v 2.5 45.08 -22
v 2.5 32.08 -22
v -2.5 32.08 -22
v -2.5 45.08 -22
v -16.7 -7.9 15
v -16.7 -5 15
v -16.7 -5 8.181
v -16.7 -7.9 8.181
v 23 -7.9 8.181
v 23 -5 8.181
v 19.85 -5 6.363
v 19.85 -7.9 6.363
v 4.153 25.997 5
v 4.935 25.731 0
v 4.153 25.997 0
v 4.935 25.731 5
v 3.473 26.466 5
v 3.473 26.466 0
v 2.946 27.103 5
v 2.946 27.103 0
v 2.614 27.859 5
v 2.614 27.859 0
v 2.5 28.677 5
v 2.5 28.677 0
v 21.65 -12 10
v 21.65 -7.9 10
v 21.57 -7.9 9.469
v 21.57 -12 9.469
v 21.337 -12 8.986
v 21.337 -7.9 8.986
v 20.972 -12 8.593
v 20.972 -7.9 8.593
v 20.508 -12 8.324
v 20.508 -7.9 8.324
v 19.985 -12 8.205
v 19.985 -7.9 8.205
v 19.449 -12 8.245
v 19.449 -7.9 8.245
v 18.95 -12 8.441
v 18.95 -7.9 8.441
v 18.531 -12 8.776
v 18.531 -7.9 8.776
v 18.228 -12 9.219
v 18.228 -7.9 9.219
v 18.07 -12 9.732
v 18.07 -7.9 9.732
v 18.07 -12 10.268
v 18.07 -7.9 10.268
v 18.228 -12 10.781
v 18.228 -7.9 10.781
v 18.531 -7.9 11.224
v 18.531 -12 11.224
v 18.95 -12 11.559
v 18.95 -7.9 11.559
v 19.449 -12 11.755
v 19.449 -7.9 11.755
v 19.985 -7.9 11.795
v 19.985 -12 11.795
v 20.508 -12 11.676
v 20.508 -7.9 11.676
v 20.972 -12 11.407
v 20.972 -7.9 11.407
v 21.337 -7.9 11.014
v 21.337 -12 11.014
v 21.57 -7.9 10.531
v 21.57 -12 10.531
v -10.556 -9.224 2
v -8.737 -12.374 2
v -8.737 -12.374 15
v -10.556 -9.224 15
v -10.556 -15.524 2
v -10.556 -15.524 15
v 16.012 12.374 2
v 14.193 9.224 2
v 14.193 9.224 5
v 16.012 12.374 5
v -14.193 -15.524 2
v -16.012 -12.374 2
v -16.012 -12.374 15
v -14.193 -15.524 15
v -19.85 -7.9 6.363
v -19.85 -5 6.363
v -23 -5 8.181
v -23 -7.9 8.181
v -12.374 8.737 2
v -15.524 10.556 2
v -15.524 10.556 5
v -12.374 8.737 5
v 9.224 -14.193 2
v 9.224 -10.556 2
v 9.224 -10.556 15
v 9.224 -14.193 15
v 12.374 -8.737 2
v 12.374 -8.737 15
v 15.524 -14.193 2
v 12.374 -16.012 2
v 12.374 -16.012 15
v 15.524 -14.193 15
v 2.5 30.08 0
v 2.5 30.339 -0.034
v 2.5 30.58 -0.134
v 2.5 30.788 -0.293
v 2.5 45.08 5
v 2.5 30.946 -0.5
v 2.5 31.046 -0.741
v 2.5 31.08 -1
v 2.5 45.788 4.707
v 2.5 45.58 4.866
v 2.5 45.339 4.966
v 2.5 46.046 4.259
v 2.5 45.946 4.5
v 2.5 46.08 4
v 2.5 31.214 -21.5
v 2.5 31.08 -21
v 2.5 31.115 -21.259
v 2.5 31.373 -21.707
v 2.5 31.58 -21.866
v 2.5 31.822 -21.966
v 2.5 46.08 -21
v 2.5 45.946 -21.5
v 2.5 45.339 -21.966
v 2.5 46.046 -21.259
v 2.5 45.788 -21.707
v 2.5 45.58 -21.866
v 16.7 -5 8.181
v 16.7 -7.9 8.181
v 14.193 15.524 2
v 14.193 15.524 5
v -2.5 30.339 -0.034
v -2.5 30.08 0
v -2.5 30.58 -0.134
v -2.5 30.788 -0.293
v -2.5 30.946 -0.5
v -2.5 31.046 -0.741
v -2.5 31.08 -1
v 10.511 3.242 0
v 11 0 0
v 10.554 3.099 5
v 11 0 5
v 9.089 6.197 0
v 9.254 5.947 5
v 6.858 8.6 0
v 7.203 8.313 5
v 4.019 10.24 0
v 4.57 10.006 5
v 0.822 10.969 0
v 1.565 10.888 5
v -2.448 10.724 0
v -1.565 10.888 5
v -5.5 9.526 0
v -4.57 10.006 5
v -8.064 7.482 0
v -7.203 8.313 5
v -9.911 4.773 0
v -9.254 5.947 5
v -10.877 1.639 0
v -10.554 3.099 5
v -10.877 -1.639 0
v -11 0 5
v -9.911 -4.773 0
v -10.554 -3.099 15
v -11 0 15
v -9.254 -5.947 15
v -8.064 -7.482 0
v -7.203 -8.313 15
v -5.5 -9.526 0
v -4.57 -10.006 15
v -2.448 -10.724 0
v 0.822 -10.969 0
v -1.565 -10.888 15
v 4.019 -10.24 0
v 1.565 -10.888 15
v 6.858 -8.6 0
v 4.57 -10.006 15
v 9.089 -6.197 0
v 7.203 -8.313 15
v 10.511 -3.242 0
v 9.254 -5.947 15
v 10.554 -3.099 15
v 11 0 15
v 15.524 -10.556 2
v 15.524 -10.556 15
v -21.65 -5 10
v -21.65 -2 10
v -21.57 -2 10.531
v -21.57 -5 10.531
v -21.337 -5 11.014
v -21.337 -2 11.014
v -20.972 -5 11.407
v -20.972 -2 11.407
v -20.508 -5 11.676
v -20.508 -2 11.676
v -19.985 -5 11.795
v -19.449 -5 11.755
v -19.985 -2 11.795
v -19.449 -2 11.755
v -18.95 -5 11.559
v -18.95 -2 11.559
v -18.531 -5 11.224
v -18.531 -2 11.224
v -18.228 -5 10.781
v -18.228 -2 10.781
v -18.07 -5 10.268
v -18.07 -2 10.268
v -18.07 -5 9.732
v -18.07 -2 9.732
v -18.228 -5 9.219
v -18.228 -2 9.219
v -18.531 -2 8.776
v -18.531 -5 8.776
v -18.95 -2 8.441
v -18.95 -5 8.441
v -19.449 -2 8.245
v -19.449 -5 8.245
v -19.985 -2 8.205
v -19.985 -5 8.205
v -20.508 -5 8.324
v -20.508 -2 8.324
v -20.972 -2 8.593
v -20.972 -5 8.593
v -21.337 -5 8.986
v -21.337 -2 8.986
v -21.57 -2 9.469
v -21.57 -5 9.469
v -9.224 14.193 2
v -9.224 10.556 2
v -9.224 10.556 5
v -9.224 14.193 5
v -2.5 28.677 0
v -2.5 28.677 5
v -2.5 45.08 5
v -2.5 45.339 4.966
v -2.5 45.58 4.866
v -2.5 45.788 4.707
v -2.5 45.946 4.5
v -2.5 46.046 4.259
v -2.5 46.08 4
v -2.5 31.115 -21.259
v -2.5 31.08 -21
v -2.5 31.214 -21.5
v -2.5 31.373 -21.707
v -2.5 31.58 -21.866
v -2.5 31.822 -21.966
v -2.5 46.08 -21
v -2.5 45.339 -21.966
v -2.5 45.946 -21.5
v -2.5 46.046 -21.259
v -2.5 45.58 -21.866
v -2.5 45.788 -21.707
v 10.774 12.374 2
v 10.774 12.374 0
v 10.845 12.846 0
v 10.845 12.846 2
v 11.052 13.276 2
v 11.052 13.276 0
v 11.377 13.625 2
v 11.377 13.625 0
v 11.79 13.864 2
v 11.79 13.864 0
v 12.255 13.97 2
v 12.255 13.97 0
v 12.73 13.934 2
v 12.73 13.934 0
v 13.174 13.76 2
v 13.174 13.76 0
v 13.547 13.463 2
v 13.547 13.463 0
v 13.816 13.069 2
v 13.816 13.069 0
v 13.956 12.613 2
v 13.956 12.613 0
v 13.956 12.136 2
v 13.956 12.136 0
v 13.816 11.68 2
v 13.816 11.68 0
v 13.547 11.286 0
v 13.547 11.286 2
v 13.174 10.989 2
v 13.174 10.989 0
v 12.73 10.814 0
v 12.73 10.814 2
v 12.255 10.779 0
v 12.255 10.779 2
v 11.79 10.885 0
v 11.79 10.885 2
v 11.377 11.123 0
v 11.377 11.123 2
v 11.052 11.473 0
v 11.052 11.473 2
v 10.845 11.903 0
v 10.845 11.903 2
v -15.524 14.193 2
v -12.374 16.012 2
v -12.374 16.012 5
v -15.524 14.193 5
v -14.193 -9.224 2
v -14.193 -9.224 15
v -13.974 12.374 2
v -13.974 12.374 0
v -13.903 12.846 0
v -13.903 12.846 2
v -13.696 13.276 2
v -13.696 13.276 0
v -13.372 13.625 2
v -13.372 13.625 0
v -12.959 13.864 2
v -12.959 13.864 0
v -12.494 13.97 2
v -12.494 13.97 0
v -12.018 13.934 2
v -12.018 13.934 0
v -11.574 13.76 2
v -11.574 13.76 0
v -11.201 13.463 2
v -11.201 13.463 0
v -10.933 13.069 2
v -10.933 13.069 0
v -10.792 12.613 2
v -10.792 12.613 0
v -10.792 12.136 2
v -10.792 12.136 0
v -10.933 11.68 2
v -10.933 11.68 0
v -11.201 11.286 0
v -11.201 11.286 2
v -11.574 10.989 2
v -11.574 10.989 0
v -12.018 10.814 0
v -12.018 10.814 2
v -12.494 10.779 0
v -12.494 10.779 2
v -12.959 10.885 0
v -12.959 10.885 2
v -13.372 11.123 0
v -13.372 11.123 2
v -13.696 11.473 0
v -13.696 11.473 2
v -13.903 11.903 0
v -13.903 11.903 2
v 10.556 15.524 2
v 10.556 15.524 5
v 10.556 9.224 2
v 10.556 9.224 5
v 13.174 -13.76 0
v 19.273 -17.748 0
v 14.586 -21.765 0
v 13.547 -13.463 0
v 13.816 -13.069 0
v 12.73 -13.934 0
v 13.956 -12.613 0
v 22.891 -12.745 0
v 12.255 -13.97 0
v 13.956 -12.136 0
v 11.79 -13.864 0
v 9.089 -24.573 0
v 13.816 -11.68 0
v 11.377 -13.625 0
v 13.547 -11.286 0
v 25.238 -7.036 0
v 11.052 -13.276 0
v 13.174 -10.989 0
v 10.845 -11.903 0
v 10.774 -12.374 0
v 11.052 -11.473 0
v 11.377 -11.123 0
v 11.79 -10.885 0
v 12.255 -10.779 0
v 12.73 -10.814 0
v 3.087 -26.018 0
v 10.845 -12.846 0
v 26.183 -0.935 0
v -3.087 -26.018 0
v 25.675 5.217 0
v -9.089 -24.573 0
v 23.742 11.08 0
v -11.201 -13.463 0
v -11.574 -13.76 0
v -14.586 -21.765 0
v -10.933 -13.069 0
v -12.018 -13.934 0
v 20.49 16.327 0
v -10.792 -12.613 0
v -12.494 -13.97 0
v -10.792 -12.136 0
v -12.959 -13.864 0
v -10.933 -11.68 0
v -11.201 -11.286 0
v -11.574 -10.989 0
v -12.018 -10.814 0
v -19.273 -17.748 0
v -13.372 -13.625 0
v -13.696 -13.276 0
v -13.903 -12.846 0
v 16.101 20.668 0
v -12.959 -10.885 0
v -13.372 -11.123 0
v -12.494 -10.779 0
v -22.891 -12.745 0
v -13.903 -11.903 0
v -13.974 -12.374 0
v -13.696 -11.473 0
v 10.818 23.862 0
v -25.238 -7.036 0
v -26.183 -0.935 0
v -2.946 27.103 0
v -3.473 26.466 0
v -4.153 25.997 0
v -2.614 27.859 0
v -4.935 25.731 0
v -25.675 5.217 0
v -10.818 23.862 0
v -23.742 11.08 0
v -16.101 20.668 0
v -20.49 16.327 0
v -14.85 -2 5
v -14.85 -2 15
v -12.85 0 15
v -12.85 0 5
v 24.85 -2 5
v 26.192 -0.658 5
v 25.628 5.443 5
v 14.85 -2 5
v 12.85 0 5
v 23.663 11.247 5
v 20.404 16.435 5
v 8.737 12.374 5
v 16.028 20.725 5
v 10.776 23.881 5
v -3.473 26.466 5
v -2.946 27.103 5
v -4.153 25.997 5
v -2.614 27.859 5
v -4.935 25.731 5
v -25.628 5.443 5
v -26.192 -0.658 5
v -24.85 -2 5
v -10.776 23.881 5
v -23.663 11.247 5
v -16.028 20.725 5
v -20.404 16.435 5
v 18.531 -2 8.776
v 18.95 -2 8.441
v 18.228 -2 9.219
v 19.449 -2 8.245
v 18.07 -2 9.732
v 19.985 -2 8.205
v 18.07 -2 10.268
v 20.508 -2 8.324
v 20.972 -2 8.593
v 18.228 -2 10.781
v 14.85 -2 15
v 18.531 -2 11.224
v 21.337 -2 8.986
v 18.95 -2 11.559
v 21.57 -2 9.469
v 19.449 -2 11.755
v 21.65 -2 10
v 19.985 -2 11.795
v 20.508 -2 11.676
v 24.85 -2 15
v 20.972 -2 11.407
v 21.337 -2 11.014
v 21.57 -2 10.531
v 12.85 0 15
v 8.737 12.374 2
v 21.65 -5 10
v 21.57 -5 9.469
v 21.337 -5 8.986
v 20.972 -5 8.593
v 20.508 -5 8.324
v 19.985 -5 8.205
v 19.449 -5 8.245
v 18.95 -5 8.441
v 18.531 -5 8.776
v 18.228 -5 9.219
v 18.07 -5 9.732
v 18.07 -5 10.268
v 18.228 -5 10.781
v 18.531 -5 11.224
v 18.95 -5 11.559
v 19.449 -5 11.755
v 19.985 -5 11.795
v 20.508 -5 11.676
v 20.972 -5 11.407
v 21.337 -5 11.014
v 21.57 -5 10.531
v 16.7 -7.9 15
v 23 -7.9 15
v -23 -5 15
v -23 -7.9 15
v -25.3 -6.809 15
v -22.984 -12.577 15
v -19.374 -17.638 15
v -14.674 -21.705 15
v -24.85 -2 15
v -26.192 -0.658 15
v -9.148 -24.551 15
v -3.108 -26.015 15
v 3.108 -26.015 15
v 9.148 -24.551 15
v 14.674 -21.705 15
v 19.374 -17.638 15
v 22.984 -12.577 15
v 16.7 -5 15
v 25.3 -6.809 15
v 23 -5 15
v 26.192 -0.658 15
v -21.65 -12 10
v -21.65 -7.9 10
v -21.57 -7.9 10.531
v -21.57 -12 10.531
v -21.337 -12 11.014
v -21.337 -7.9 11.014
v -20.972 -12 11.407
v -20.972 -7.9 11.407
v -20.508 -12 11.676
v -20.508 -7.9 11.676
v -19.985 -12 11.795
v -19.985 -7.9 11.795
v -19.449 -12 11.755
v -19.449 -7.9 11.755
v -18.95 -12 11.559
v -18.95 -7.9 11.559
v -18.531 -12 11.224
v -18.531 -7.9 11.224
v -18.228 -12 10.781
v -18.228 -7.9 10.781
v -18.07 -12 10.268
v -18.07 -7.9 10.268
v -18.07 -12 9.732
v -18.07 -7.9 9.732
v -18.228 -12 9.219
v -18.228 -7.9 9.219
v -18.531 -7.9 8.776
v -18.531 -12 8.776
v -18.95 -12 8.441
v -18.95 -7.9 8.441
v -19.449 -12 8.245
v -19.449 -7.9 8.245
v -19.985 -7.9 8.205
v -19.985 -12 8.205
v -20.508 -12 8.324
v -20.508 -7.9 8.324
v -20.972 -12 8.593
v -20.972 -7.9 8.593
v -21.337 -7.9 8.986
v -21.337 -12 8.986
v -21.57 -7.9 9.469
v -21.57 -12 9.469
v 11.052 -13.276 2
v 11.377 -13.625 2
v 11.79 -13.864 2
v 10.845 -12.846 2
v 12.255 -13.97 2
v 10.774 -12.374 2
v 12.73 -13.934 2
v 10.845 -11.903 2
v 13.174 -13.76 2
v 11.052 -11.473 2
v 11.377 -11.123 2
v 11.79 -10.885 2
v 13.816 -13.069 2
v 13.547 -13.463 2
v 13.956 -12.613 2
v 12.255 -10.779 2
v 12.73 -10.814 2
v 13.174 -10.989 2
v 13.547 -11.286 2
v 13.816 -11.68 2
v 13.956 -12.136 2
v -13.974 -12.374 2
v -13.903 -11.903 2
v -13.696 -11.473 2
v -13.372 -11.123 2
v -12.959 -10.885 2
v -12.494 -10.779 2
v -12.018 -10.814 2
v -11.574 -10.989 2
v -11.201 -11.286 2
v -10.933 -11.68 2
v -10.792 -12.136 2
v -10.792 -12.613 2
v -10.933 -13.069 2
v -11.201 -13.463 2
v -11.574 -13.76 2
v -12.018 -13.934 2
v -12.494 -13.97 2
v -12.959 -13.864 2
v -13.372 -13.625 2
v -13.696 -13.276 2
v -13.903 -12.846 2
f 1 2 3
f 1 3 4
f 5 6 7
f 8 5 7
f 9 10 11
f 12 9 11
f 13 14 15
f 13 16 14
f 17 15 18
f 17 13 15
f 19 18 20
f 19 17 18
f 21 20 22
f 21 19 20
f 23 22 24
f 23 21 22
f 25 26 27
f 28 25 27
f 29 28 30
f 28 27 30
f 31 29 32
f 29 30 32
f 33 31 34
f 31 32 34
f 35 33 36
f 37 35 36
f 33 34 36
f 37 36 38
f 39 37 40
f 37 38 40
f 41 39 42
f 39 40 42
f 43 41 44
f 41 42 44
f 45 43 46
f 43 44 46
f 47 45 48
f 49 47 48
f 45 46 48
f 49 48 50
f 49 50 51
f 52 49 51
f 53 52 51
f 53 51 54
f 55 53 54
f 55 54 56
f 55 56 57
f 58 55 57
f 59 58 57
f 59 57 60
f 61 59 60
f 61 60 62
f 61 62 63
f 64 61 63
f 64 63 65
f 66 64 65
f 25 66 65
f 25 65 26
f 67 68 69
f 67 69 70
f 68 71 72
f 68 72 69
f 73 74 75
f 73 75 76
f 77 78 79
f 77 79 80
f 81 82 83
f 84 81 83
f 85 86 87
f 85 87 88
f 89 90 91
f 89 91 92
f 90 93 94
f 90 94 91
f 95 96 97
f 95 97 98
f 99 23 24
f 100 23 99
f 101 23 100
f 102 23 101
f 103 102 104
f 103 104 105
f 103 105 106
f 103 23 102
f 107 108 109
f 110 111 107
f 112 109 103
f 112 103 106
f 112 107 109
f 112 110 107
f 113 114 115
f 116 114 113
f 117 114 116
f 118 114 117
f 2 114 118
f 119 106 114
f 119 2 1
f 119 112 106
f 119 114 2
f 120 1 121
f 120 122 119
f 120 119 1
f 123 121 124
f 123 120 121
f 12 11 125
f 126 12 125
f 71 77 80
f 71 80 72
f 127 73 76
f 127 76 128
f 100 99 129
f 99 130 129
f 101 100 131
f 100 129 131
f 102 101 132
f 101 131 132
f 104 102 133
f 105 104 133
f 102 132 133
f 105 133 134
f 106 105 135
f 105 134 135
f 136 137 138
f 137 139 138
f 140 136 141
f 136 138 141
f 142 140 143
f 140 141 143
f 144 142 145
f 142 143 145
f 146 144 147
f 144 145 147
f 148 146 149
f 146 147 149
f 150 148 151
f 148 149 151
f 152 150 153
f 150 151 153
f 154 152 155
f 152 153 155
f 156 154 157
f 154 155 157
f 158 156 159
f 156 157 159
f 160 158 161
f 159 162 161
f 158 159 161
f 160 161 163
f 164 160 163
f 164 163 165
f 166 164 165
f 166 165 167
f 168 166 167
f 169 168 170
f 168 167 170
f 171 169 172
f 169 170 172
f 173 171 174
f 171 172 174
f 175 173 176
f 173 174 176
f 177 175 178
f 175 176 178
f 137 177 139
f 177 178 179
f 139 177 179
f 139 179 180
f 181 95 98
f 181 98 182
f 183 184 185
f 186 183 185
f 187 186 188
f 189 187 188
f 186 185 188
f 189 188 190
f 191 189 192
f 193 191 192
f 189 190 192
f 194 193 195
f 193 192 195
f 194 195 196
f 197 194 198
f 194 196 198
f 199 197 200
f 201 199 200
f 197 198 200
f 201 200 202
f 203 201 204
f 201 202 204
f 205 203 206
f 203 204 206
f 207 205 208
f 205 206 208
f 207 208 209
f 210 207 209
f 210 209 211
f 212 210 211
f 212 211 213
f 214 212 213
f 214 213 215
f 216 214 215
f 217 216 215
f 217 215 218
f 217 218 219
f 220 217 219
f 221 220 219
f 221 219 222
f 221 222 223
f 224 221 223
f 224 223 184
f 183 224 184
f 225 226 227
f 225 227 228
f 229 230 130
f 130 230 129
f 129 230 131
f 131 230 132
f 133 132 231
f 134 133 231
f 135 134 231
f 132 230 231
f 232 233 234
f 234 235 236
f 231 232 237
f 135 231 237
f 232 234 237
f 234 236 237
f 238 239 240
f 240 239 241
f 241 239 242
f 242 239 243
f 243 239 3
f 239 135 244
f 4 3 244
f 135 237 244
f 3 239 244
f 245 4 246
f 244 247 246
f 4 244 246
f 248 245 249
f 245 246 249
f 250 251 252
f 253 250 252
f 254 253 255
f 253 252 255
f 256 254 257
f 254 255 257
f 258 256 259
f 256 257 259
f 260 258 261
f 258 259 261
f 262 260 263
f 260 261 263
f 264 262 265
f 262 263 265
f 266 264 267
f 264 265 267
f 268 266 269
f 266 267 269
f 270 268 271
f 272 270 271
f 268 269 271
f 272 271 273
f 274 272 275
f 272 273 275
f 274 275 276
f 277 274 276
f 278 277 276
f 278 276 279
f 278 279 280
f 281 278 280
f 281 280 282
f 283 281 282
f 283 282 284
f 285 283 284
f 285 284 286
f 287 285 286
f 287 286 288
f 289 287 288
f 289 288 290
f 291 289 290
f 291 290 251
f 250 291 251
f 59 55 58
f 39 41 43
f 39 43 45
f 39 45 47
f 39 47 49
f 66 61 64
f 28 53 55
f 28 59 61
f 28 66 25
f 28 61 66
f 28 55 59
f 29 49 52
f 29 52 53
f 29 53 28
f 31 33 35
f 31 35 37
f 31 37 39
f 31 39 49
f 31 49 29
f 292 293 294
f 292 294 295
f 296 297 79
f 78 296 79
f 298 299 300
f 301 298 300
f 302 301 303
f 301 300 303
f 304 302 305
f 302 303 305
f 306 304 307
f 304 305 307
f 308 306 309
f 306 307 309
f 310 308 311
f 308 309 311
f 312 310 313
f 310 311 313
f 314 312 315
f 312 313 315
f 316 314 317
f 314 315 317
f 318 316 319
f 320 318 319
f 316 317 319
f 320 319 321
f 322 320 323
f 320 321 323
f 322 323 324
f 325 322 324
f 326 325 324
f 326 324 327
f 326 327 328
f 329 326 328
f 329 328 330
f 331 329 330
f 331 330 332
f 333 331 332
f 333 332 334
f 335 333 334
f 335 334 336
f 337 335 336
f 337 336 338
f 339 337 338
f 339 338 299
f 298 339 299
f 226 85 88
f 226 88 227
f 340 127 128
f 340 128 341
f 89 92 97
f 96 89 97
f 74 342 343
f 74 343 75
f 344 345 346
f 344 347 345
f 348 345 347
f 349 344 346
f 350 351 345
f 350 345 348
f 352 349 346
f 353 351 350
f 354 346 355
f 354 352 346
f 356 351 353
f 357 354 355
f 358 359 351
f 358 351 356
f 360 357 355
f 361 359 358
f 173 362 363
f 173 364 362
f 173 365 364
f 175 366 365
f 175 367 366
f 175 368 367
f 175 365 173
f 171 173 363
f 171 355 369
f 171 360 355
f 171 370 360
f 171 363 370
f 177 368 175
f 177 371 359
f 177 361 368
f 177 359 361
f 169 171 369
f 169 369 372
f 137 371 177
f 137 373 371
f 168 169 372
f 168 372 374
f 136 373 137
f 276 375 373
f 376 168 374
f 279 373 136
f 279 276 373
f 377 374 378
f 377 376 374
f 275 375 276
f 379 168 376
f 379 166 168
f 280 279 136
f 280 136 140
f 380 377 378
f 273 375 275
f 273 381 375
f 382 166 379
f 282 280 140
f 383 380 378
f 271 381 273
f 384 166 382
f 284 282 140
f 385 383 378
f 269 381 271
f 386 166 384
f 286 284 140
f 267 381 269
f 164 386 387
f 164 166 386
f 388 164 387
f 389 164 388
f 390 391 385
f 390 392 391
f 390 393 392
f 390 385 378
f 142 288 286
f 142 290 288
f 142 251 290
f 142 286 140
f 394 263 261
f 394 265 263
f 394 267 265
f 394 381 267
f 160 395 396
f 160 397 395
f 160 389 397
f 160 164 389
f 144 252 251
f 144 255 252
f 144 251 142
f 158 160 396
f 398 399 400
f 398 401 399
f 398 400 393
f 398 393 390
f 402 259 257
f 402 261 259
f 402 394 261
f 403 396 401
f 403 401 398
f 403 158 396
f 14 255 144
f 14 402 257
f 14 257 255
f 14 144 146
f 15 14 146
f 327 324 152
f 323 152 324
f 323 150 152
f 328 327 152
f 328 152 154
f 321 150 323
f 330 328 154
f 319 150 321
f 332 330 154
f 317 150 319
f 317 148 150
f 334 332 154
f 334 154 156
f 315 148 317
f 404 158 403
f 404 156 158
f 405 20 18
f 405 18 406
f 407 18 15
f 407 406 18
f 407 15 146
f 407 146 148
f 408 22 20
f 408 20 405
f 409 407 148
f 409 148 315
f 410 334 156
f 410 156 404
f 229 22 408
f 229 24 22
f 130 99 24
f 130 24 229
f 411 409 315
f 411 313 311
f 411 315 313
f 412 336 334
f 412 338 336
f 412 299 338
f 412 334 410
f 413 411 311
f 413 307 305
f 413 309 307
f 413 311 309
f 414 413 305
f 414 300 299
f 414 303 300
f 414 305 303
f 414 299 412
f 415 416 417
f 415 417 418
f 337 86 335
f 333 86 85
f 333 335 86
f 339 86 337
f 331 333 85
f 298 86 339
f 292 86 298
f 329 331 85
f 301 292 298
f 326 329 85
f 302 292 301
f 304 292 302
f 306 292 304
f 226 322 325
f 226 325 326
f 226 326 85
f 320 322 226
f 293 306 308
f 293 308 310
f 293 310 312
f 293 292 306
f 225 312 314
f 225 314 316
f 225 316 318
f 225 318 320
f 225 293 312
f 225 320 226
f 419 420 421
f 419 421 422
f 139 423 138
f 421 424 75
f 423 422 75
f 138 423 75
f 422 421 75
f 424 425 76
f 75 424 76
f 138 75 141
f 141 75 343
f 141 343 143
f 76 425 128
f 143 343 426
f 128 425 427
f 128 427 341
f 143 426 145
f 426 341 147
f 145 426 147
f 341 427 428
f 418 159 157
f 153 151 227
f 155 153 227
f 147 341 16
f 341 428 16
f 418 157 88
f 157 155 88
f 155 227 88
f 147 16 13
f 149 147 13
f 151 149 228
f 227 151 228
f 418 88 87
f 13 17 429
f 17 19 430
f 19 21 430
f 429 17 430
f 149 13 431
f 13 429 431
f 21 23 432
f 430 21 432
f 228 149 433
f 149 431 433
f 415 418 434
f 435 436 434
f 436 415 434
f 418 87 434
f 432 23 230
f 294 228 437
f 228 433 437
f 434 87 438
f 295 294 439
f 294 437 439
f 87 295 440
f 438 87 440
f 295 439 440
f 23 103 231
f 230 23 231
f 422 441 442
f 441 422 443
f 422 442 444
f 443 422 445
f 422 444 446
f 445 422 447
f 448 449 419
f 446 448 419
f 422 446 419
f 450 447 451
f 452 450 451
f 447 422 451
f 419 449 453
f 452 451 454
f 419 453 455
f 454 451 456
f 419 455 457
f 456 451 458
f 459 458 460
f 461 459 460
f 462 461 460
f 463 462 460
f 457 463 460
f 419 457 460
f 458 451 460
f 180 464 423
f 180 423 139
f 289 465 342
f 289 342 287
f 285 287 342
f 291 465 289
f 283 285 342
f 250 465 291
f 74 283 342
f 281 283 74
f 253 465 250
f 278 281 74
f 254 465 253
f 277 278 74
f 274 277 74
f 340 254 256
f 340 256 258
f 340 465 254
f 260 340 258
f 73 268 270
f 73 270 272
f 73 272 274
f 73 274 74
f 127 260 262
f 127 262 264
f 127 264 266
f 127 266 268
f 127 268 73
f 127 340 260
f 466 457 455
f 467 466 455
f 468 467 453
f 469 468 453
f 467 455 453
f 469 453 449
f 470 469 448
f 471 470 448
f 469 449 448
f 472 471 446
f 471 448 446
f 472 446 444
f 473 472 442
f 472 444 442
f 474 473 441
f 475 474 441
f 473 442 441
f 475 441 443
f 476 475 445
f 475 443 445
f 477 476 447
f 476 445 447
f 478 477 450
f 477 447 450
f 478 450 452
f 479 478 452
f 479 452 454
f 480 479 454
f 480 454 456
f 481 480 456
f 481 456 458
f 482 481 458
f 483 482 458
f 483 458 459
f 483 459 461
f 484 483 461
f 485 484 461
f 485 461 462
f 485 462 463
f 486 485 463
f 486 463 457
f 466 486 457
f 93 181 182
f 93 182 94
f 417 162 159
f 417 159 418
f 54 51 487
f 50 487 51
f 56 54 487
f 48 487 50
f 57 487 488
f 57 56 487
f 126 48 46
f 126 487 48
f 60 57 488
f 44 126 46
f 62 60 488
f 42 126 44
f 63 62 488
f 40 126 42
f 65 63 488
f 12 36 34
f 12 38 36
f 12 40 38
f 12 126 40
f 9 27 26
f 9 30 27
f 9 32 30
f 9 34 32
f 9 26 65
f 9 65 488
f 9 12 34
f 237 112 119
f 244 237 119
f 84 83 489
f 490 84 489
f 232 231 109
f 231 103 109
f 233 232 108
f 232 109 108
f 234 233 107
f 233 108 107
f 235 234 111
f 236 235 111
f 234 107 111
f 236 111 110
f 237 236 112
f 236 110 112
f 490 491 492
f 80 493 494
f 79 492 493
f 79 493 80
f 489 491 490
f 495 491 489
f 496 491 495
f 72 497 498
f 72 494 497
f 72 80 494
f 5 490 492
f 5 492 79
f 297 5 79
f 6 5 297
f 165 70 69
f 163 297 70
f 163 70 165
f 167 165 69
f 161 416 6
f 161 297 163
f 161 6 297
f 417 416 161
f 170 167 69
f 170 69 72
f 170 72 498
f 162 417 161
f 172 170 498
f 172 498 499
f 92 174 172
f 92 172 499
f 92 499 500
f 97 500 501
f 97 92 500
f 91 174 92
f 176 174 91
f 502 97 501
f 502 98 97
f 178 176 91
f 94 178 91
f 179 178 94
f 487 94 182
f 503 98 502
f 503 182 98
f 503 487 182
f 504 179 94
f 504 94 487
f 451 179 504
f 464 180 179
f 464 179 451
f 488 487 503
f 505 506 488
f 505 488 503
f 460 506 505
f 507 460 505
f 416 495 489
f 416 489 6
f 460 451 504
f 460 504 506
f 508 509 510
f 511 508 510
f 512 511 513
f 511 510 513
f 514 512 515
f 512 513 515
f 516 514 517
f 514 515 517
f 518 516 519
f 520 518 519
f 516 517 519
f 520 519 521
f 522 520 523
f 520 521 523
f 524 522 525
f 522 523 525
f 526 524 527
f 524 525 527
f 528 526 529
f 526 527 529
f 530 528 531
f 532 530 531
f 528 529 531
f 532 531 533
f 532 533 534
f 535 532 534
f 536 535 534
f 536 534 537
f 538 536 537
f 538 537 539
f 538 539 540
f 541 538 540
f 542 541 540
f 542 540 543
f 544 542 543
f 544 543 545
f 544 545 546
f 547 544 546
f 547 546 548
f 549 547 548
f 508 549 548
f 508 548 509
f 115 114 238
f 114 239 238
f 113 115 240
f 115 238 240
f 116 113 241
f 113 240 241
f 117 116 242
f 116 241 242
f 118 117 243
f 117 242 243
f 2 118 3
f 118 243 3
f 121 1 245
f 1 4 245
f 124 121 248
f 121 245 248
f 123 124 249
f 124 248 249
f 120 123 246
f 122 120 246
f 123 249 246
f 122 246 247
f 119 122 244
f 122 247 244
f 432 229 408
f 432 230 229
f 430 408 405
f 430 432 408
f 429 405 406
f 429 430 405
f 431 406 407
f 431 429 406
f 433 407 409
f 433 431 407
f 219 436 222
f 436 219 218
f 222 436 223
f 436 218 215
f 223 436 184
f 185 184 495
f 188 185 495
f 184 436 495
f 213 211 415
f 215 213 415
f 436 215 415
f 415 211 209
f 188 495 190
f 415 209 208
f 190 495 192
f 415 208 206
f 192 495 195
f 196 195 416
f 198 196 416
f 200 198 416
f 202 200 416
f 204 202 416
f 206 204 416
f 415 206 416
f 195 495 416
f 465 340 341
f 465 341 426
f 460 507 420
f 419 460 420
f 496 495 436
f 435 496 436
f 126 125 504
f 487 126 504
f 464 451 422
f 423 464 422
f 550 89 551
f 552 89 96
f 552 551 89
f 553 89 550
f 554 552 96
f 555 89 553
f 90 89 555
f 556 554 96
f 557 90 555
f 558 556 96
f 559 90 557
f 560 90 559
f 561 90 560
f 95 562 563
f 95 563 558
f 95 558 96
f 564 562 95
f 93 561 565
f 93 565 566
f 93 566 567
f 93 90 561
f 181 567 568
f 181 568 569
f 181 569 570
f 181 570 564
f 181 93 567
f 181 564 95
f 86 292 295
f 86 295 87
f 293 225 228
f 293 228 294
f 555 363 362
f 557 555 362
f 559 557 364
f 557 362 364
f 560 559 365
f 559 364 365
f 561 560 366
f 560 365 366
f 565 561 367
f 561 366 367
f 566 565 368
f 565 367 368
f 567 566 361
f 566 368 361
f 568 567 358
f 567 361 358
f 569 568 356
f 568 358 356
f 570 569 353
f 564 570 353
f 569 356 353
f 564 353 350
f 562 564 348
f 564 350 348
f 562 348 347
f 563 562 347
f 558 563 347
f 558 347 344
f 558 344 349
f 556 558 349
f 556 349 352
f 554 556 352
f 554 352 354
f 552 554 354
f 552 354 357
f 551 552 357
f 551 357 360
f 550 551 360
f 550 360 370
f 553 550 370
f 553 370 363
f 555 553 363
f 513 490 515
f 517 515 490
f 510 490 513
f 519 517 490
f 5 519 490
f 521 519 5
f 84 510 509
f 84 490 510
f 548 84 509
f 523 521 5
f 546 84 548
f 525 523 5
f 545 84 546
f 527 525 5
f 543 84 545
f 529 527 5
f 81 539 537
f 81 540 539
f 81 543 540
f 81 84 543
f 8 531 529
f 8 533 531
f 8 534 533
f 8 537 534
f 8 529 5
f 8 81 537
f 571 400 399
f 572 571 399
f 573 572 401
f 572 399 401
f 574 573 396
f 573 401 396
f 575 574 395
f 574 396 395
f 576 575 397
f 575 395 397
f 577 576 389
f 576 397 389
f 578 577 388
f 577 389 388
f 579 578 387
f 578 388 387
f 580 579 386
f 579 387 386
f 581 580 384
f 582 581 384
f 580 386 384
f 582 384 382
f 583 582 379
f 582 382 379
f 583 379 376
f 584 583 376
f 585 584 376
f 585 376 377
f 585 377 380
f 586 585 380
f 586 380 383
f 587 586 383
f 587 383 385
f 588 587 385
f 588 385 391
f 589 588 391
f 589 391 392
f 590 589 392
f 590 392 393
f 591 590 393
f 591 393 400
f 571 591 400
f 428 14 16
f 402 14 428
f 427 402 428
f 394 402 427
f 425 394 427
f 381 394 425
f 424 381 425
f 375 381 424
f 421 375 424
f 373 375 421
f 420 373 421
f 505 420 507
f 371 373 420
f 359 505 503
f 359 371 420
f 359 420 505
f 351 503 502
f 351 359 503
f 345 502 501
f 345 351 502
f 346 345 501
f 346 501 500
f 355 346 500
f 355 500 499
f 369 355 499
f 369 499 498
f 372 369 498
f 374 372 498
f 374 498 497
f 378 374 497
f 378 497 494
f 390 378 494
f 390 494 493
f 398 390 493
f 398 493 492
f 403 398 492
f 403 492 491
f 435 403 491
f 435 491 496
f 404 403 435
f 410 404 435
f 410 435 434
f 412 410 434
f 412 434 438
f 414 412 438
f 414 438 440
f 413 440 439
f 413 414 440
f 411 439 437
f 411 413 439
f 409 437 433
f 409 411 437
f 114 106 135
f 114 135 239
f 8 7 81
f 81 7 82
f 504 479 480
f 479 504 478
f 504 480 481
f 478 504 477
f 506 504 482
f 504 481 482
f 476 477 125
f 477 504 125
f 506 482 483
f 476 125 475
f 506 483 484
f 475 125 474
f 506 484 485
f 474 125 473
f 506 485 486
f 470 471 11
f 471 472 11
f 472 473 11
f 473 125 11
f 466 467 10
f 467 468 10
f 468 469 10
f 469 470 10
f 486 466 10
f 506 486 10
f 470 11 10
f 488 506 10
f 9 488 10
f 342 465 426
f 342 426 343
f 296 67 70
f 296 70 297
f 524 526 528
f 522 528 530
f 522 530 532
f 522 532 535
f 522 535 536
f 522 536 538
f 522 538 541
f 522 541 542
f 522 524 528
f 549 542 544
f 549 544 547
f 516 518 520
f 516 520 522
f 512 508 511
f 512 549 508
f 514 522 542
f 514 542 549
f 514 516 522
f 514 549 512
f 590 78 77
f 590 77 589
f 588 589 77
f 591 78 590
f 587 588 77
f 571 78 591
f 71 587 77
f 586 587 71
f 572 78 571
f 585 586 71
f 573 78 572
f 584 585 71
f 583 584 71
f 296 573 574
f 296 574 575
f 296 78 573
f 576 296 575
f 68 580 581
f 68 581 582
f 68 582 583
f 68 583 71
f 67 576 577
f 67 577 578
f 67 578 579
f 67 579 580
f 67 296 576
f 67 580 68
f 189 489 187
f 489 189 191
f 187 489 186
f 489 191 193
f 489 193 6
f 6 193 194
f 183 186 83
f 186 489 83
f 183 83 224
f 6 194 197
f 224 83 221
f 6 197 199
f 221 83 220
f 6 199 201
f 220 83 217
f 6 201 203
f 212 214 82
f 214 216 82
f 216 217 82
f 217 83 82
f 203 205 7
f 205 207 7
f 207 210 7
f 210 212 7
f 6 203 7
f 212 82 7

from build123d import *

# Parameters (mm, degrees)
ESBO_O1_R                = 28.7
RESSALTO_EXTRUS_O1_DEPTH = 5
ESBO_O2_R                = 11
CORTE_EXTRUS_O1_DEPTH    = 8
ESBO_O3_R                = 7.5
CORTE_EXTRUS_O2_DEPTH    = 42.801674608
RESSALTO_EXTRUS_O4_START = 10
RESSALTO_EXTRUS_O4_DEPTH = 10
ESBO_O9_W                = 10
ESBO_O9_H                = 2
CORTE_EXTRUS_O5_DEPTH    = 10
CHANFRO1_SIZE            = 2
ESBO_O10_R               = 1.8
CORTE_EXTRUS_O6_DEPTH    = 10
CORTE_EXTRUS_O7_START    = -3
CORTE_EXTRUS_O7_DEPTH    = 2.9
CORTE_EXTRUS_O8_START    = -5
ESBO_O13_R               = 28.7
CORTE_EXTRUS_O8_DEPTH    = 5
ESBO_O14_R               = 28.7
ESBO_O14_R_2             = 26.2
CORTE_EXTRUS_O9_DEPTH    = 44.271006459
ESBO_O15_R               = 1.6
CORTE_EXTRUS_O10_DEPTH   = 40.973491216
CORTE_EXTRUS_O11_START   = -3
CORTE_EXTRUS_O11_DEPTH   = 42.378118766
RESSALTO_EXTRUS_O5_START = -5
RESSALTO_EXTRUS_O5_DEPTH = 5
ESBO_O19_W               = 22
ESBO_O19_H               = 15
RESSALTO_EXTRUS_O6_DEPTH = 5
FILETE1_R                = 3
FILETE2_R                = 1
FILETE3_R                = 1


with BuildPart() as part:
    # Esboço1 → Ressalto-extrusão1 (new, symmetric)
    with BuildSketch(Plane.XY):
        Circle(ESBO_O1_R)
    extrude(amount=RESSALTO_EXTRUS_O1_DEPTH, both=True)

    # Esboço2 → Corte-extrusão1 (cut)
    with BuildSketch(Plane.XY.offset(5)):
        Circle(ESBO_O2_R)
    extrude(amount=-CORTE_EXTRUS_O1_DEPTH, mode=Mode.SUBTRACT)

    # Esboço3 → Corte-extrusão2 (cut, through all)
    with BuildSketch(Plane(origin=(0, 0, -5), x_dir=(-1, 0, 0), z_dir=(0, 0, -1))):
        Circle(ESBO_O3_R)
    extrude(amount=-CORTE_EXTRUS_O2_DEPTH, mode=Mode.SUBTRACT)

    # Esboço8 → Ressalto-extrusão4 (add)
    with BuildSketch(Plane.XY.offset(5).offset(RESSALTO_EXTRUS_O4_START)):
        with BuildLine():
            Line((-11, 0), (-28.7, 0))
            ThreePointArc((-28.7, 0), (0, -28.7), (28.7, 0))
            Line((28.7, 0), (11, 0))
            ThreePointArc((11, 0), (0, -11), (-11, 0))
        make_face()
    extrude(amount=-RESSALTO_EXTRUS_O4_DEPTH)

    # Esboço9 → Corte-extrusão5 (cut)
    with BuildSketch(Plane.XY.offset(15)):
        with Locations((-19.85, -1)):
            Rectangle(ESBO_O9_W, ESBO_O9_H)
        with Locations((19.85, -1)):
            Rectangle(ESBO_O9_W, ESBO_O9_H)
    extrude(amount=-CORTE_EXTRUS_O5_DEPTH, mode=Mode.SUBTRACT)

    # Chanfro1
    chanfro1_edges = [part.edges().sort_by_distance(p)[0] for p in [
        (24.85, 0, 10),
        (14.85, 0, 10),
        (-14.85, 0, 10),
        (-24.85, 0, 10),
    ]]
    chamfer(chanfro1_edges, length=CHANFRO1_SIZE - 0.0001)  # a hair under: the kernel refuses the full size

    # Esboço10 → Corte-extrusão6 (cut)
    with BuildSketch(Plane(origin=(0, -2, 0), x_dir=(1, 0, 0), z_dir=(0, 1, 0))):
        with Locations(Location((-19.85, -10, 0), (0, 0, 180))):
            Circle(ESBO_O10_R)
        with Locations((19.85, -10)):
            Circle(ESBO_O10_R)
    extrude(amount=-CORTE_EXTRUS_O6_DEPTH, mode=Mode.SUBTRACT)

    # Esboço11 → Corte-extrusão7 (cut)
    with BuildSketch(Plane(origin=(0, -2, 0), x_dir=(1, 0, 0), z_dir=(0, 1, 0)).offset(CORTE_EXTRUS_O7_START)):
        Polygon((-23, -8.181346652), (-23, -11.818653348), (-23, -15), (-16.7, -15), (-16.7, -11.818653348), (-16.7, -8.181346652), (-19.85, -6.362693304), align=None)
        Polygon((23, -15), (23, -11.818653348), (23, -8.181346652), (19.85, -6.362693304), (16.7, -8.181346652), (16.7, -11.818653348), (16.7, -15), align=None)
    extrude(amount=-CORTE_EXTRUS_O7_DEPTH, mode=Mode.SUBTRACT)

    # Esboço13 → Corte-extrusão8 (cut)
    with BuildSketch(Plane(origin=(0, 0, -5), x_dir=(-1, 0, 0), z_dir=(0, 0, -1)).offset(CORTE_EXTRUS_O8_START)):
        Circle(ESBO_O13_R)
    extrude(amount=CORTE_EXTRUS_O8_DEPTH, mode=Mode.SUBTRACT)

    # Esboço14 → Corte-extrusão9 (cut, through all)
    with BuildSketch(Plane(origin=(0, 0, 0), x_dir=(-1, 0, 0), z_dir=(0, 0, -1))):
        Circle(ESBO_O14_R)
        Circle(ESBO_O14_R_2, mode=Mode.SUBTRACT)
    extrude(amount=-CORTE_EXTRUS_O9_DEPTH, mode=Mode.SUBTRACT)

    # Esboço15 → Corte-extrusão10 (cut, through all)
    with BuildSketch(Plane(origin=(0, 0, 0), x_dir=(-1, 0, 0), z_dir=(0, 0, -1))):
        with Locations((-12.374368671, 12.374368671)):
            Circle(ESBO_O15_R)
        with Locations((12.374368671, 12.374368671)):
            Circle(ESBO_O15_R)
        with Locations((12.374368671, -12.374368671)):
            Circle(ESBO_O15_R)
        with Locations((-12.374368671, -12.374368671)):
            Circle(ESBO_O15_R)
    extrude(amount=-CORTE_EXTRUS_O10_DEPTH, mode=Mode.SUBTRACT)

    # Esboço17 → Corte-extrusão11 (cut, through all)
    with BuildSketch(Plane.XY.offset(5).offset(CORTE_EXTRUS_O11_START)):
        Polygon((-15.524368671, 14.193022019), (-15.524368671, 10.555715323), (-12.374368671, 8.737061975), (-9.224368671, 10.555715323), (-9.224368671, 14.193022019), (-12.374368671, 16.011675367), align=None)
        Polygon((16.011675367, 12.374368671), (14.193022019, 15.524368671), (10.555715323, 15.524368671), (8.737061975, 12.374368671), (10.555715323, 9.224368671), (14.193022019, 9.224368671), align=None)
        Polygon((12.374368671, -16.011675367), (15.524368671, -14.193022019), (15.524368671, -10.555715323), (12.374368671, -8.737061975), (9.224368671, -10.555715323), (9.224368671, -14.193022019), align=None)
        Polygon((-16.011675367, -12.374368671), (-14.193022019, -15.524368671), (-10.555715323, -15.524368671), (-8.737061975, -12.374368671), (-10.555715323, -9.224368671), (-14.193022019, -9.224368671), align=None)
    extrude(amount=CORTE_EXTRUS_O11_DEPTH, mode=Mode.SUBTRACT)

    # Esboço18 → Ressalto-extrusão5 (add)
    with BuildSketch(Plane.XY.offset(5).offset(RESSALTO_EXTRUS_O5_START)):
        with BuildLine():
            Line((-2.5, 26.08045245), (-2.5, 46.08045245))
            Line((-2.5, 46.08045245), (2.5, 46.08045245))
            Line((2.5, 46.08045245), (2.5, 26.08045245))
            ThreePointArc((2.5, 26.08045245), (0, 26.2), (-2.5, 26.08045245))
        make_face()
    extrude(amount=RESSALTO_EXTRUS_O5_DEPTH)

    # Esboço19 → Ressalto-extrusão6 (add)
    with BuildSketch(Plane(origin=(2.5, 0, 0), x_dir=(0, 0, -1), z_dir=(1, 0, 0))):
        with Locations((11, 38.58045245)):
            Rectangle(ESBO_O19_W, ESBO_O19_H)
    extrude(amount=-RESSALTO_EXTRUS_O6_DEPTH)

    # Filete1
    filete1_edges = [part.edges().sort_by_distance(p)[0] for p in [
        (2.5, 26.08045245, 2.5),
        (-2.5, 26.08045245, 2.5),
    ]]
    fillet(filete1_edges, radius=FILETE1_R)

    # Filete2
    filete2_edges = [part.edges().sort_by_distance(p)[0] for p in [
        (0, 31.08045245, 0),
    ]]
    fillet(filete2_edges, radius=FILETE2_R)

    # Filete3
    filete3_edges = [part.edges().sort_by_distance(p)[0] for p in [
        (0, 46.08045245, 5),
        (0, 46.08045245, -22),
        (0, 31.08045245, -22),
    ]]
    fillet(filete3_edges, radius=FILETE3_R)


solid = part.part
